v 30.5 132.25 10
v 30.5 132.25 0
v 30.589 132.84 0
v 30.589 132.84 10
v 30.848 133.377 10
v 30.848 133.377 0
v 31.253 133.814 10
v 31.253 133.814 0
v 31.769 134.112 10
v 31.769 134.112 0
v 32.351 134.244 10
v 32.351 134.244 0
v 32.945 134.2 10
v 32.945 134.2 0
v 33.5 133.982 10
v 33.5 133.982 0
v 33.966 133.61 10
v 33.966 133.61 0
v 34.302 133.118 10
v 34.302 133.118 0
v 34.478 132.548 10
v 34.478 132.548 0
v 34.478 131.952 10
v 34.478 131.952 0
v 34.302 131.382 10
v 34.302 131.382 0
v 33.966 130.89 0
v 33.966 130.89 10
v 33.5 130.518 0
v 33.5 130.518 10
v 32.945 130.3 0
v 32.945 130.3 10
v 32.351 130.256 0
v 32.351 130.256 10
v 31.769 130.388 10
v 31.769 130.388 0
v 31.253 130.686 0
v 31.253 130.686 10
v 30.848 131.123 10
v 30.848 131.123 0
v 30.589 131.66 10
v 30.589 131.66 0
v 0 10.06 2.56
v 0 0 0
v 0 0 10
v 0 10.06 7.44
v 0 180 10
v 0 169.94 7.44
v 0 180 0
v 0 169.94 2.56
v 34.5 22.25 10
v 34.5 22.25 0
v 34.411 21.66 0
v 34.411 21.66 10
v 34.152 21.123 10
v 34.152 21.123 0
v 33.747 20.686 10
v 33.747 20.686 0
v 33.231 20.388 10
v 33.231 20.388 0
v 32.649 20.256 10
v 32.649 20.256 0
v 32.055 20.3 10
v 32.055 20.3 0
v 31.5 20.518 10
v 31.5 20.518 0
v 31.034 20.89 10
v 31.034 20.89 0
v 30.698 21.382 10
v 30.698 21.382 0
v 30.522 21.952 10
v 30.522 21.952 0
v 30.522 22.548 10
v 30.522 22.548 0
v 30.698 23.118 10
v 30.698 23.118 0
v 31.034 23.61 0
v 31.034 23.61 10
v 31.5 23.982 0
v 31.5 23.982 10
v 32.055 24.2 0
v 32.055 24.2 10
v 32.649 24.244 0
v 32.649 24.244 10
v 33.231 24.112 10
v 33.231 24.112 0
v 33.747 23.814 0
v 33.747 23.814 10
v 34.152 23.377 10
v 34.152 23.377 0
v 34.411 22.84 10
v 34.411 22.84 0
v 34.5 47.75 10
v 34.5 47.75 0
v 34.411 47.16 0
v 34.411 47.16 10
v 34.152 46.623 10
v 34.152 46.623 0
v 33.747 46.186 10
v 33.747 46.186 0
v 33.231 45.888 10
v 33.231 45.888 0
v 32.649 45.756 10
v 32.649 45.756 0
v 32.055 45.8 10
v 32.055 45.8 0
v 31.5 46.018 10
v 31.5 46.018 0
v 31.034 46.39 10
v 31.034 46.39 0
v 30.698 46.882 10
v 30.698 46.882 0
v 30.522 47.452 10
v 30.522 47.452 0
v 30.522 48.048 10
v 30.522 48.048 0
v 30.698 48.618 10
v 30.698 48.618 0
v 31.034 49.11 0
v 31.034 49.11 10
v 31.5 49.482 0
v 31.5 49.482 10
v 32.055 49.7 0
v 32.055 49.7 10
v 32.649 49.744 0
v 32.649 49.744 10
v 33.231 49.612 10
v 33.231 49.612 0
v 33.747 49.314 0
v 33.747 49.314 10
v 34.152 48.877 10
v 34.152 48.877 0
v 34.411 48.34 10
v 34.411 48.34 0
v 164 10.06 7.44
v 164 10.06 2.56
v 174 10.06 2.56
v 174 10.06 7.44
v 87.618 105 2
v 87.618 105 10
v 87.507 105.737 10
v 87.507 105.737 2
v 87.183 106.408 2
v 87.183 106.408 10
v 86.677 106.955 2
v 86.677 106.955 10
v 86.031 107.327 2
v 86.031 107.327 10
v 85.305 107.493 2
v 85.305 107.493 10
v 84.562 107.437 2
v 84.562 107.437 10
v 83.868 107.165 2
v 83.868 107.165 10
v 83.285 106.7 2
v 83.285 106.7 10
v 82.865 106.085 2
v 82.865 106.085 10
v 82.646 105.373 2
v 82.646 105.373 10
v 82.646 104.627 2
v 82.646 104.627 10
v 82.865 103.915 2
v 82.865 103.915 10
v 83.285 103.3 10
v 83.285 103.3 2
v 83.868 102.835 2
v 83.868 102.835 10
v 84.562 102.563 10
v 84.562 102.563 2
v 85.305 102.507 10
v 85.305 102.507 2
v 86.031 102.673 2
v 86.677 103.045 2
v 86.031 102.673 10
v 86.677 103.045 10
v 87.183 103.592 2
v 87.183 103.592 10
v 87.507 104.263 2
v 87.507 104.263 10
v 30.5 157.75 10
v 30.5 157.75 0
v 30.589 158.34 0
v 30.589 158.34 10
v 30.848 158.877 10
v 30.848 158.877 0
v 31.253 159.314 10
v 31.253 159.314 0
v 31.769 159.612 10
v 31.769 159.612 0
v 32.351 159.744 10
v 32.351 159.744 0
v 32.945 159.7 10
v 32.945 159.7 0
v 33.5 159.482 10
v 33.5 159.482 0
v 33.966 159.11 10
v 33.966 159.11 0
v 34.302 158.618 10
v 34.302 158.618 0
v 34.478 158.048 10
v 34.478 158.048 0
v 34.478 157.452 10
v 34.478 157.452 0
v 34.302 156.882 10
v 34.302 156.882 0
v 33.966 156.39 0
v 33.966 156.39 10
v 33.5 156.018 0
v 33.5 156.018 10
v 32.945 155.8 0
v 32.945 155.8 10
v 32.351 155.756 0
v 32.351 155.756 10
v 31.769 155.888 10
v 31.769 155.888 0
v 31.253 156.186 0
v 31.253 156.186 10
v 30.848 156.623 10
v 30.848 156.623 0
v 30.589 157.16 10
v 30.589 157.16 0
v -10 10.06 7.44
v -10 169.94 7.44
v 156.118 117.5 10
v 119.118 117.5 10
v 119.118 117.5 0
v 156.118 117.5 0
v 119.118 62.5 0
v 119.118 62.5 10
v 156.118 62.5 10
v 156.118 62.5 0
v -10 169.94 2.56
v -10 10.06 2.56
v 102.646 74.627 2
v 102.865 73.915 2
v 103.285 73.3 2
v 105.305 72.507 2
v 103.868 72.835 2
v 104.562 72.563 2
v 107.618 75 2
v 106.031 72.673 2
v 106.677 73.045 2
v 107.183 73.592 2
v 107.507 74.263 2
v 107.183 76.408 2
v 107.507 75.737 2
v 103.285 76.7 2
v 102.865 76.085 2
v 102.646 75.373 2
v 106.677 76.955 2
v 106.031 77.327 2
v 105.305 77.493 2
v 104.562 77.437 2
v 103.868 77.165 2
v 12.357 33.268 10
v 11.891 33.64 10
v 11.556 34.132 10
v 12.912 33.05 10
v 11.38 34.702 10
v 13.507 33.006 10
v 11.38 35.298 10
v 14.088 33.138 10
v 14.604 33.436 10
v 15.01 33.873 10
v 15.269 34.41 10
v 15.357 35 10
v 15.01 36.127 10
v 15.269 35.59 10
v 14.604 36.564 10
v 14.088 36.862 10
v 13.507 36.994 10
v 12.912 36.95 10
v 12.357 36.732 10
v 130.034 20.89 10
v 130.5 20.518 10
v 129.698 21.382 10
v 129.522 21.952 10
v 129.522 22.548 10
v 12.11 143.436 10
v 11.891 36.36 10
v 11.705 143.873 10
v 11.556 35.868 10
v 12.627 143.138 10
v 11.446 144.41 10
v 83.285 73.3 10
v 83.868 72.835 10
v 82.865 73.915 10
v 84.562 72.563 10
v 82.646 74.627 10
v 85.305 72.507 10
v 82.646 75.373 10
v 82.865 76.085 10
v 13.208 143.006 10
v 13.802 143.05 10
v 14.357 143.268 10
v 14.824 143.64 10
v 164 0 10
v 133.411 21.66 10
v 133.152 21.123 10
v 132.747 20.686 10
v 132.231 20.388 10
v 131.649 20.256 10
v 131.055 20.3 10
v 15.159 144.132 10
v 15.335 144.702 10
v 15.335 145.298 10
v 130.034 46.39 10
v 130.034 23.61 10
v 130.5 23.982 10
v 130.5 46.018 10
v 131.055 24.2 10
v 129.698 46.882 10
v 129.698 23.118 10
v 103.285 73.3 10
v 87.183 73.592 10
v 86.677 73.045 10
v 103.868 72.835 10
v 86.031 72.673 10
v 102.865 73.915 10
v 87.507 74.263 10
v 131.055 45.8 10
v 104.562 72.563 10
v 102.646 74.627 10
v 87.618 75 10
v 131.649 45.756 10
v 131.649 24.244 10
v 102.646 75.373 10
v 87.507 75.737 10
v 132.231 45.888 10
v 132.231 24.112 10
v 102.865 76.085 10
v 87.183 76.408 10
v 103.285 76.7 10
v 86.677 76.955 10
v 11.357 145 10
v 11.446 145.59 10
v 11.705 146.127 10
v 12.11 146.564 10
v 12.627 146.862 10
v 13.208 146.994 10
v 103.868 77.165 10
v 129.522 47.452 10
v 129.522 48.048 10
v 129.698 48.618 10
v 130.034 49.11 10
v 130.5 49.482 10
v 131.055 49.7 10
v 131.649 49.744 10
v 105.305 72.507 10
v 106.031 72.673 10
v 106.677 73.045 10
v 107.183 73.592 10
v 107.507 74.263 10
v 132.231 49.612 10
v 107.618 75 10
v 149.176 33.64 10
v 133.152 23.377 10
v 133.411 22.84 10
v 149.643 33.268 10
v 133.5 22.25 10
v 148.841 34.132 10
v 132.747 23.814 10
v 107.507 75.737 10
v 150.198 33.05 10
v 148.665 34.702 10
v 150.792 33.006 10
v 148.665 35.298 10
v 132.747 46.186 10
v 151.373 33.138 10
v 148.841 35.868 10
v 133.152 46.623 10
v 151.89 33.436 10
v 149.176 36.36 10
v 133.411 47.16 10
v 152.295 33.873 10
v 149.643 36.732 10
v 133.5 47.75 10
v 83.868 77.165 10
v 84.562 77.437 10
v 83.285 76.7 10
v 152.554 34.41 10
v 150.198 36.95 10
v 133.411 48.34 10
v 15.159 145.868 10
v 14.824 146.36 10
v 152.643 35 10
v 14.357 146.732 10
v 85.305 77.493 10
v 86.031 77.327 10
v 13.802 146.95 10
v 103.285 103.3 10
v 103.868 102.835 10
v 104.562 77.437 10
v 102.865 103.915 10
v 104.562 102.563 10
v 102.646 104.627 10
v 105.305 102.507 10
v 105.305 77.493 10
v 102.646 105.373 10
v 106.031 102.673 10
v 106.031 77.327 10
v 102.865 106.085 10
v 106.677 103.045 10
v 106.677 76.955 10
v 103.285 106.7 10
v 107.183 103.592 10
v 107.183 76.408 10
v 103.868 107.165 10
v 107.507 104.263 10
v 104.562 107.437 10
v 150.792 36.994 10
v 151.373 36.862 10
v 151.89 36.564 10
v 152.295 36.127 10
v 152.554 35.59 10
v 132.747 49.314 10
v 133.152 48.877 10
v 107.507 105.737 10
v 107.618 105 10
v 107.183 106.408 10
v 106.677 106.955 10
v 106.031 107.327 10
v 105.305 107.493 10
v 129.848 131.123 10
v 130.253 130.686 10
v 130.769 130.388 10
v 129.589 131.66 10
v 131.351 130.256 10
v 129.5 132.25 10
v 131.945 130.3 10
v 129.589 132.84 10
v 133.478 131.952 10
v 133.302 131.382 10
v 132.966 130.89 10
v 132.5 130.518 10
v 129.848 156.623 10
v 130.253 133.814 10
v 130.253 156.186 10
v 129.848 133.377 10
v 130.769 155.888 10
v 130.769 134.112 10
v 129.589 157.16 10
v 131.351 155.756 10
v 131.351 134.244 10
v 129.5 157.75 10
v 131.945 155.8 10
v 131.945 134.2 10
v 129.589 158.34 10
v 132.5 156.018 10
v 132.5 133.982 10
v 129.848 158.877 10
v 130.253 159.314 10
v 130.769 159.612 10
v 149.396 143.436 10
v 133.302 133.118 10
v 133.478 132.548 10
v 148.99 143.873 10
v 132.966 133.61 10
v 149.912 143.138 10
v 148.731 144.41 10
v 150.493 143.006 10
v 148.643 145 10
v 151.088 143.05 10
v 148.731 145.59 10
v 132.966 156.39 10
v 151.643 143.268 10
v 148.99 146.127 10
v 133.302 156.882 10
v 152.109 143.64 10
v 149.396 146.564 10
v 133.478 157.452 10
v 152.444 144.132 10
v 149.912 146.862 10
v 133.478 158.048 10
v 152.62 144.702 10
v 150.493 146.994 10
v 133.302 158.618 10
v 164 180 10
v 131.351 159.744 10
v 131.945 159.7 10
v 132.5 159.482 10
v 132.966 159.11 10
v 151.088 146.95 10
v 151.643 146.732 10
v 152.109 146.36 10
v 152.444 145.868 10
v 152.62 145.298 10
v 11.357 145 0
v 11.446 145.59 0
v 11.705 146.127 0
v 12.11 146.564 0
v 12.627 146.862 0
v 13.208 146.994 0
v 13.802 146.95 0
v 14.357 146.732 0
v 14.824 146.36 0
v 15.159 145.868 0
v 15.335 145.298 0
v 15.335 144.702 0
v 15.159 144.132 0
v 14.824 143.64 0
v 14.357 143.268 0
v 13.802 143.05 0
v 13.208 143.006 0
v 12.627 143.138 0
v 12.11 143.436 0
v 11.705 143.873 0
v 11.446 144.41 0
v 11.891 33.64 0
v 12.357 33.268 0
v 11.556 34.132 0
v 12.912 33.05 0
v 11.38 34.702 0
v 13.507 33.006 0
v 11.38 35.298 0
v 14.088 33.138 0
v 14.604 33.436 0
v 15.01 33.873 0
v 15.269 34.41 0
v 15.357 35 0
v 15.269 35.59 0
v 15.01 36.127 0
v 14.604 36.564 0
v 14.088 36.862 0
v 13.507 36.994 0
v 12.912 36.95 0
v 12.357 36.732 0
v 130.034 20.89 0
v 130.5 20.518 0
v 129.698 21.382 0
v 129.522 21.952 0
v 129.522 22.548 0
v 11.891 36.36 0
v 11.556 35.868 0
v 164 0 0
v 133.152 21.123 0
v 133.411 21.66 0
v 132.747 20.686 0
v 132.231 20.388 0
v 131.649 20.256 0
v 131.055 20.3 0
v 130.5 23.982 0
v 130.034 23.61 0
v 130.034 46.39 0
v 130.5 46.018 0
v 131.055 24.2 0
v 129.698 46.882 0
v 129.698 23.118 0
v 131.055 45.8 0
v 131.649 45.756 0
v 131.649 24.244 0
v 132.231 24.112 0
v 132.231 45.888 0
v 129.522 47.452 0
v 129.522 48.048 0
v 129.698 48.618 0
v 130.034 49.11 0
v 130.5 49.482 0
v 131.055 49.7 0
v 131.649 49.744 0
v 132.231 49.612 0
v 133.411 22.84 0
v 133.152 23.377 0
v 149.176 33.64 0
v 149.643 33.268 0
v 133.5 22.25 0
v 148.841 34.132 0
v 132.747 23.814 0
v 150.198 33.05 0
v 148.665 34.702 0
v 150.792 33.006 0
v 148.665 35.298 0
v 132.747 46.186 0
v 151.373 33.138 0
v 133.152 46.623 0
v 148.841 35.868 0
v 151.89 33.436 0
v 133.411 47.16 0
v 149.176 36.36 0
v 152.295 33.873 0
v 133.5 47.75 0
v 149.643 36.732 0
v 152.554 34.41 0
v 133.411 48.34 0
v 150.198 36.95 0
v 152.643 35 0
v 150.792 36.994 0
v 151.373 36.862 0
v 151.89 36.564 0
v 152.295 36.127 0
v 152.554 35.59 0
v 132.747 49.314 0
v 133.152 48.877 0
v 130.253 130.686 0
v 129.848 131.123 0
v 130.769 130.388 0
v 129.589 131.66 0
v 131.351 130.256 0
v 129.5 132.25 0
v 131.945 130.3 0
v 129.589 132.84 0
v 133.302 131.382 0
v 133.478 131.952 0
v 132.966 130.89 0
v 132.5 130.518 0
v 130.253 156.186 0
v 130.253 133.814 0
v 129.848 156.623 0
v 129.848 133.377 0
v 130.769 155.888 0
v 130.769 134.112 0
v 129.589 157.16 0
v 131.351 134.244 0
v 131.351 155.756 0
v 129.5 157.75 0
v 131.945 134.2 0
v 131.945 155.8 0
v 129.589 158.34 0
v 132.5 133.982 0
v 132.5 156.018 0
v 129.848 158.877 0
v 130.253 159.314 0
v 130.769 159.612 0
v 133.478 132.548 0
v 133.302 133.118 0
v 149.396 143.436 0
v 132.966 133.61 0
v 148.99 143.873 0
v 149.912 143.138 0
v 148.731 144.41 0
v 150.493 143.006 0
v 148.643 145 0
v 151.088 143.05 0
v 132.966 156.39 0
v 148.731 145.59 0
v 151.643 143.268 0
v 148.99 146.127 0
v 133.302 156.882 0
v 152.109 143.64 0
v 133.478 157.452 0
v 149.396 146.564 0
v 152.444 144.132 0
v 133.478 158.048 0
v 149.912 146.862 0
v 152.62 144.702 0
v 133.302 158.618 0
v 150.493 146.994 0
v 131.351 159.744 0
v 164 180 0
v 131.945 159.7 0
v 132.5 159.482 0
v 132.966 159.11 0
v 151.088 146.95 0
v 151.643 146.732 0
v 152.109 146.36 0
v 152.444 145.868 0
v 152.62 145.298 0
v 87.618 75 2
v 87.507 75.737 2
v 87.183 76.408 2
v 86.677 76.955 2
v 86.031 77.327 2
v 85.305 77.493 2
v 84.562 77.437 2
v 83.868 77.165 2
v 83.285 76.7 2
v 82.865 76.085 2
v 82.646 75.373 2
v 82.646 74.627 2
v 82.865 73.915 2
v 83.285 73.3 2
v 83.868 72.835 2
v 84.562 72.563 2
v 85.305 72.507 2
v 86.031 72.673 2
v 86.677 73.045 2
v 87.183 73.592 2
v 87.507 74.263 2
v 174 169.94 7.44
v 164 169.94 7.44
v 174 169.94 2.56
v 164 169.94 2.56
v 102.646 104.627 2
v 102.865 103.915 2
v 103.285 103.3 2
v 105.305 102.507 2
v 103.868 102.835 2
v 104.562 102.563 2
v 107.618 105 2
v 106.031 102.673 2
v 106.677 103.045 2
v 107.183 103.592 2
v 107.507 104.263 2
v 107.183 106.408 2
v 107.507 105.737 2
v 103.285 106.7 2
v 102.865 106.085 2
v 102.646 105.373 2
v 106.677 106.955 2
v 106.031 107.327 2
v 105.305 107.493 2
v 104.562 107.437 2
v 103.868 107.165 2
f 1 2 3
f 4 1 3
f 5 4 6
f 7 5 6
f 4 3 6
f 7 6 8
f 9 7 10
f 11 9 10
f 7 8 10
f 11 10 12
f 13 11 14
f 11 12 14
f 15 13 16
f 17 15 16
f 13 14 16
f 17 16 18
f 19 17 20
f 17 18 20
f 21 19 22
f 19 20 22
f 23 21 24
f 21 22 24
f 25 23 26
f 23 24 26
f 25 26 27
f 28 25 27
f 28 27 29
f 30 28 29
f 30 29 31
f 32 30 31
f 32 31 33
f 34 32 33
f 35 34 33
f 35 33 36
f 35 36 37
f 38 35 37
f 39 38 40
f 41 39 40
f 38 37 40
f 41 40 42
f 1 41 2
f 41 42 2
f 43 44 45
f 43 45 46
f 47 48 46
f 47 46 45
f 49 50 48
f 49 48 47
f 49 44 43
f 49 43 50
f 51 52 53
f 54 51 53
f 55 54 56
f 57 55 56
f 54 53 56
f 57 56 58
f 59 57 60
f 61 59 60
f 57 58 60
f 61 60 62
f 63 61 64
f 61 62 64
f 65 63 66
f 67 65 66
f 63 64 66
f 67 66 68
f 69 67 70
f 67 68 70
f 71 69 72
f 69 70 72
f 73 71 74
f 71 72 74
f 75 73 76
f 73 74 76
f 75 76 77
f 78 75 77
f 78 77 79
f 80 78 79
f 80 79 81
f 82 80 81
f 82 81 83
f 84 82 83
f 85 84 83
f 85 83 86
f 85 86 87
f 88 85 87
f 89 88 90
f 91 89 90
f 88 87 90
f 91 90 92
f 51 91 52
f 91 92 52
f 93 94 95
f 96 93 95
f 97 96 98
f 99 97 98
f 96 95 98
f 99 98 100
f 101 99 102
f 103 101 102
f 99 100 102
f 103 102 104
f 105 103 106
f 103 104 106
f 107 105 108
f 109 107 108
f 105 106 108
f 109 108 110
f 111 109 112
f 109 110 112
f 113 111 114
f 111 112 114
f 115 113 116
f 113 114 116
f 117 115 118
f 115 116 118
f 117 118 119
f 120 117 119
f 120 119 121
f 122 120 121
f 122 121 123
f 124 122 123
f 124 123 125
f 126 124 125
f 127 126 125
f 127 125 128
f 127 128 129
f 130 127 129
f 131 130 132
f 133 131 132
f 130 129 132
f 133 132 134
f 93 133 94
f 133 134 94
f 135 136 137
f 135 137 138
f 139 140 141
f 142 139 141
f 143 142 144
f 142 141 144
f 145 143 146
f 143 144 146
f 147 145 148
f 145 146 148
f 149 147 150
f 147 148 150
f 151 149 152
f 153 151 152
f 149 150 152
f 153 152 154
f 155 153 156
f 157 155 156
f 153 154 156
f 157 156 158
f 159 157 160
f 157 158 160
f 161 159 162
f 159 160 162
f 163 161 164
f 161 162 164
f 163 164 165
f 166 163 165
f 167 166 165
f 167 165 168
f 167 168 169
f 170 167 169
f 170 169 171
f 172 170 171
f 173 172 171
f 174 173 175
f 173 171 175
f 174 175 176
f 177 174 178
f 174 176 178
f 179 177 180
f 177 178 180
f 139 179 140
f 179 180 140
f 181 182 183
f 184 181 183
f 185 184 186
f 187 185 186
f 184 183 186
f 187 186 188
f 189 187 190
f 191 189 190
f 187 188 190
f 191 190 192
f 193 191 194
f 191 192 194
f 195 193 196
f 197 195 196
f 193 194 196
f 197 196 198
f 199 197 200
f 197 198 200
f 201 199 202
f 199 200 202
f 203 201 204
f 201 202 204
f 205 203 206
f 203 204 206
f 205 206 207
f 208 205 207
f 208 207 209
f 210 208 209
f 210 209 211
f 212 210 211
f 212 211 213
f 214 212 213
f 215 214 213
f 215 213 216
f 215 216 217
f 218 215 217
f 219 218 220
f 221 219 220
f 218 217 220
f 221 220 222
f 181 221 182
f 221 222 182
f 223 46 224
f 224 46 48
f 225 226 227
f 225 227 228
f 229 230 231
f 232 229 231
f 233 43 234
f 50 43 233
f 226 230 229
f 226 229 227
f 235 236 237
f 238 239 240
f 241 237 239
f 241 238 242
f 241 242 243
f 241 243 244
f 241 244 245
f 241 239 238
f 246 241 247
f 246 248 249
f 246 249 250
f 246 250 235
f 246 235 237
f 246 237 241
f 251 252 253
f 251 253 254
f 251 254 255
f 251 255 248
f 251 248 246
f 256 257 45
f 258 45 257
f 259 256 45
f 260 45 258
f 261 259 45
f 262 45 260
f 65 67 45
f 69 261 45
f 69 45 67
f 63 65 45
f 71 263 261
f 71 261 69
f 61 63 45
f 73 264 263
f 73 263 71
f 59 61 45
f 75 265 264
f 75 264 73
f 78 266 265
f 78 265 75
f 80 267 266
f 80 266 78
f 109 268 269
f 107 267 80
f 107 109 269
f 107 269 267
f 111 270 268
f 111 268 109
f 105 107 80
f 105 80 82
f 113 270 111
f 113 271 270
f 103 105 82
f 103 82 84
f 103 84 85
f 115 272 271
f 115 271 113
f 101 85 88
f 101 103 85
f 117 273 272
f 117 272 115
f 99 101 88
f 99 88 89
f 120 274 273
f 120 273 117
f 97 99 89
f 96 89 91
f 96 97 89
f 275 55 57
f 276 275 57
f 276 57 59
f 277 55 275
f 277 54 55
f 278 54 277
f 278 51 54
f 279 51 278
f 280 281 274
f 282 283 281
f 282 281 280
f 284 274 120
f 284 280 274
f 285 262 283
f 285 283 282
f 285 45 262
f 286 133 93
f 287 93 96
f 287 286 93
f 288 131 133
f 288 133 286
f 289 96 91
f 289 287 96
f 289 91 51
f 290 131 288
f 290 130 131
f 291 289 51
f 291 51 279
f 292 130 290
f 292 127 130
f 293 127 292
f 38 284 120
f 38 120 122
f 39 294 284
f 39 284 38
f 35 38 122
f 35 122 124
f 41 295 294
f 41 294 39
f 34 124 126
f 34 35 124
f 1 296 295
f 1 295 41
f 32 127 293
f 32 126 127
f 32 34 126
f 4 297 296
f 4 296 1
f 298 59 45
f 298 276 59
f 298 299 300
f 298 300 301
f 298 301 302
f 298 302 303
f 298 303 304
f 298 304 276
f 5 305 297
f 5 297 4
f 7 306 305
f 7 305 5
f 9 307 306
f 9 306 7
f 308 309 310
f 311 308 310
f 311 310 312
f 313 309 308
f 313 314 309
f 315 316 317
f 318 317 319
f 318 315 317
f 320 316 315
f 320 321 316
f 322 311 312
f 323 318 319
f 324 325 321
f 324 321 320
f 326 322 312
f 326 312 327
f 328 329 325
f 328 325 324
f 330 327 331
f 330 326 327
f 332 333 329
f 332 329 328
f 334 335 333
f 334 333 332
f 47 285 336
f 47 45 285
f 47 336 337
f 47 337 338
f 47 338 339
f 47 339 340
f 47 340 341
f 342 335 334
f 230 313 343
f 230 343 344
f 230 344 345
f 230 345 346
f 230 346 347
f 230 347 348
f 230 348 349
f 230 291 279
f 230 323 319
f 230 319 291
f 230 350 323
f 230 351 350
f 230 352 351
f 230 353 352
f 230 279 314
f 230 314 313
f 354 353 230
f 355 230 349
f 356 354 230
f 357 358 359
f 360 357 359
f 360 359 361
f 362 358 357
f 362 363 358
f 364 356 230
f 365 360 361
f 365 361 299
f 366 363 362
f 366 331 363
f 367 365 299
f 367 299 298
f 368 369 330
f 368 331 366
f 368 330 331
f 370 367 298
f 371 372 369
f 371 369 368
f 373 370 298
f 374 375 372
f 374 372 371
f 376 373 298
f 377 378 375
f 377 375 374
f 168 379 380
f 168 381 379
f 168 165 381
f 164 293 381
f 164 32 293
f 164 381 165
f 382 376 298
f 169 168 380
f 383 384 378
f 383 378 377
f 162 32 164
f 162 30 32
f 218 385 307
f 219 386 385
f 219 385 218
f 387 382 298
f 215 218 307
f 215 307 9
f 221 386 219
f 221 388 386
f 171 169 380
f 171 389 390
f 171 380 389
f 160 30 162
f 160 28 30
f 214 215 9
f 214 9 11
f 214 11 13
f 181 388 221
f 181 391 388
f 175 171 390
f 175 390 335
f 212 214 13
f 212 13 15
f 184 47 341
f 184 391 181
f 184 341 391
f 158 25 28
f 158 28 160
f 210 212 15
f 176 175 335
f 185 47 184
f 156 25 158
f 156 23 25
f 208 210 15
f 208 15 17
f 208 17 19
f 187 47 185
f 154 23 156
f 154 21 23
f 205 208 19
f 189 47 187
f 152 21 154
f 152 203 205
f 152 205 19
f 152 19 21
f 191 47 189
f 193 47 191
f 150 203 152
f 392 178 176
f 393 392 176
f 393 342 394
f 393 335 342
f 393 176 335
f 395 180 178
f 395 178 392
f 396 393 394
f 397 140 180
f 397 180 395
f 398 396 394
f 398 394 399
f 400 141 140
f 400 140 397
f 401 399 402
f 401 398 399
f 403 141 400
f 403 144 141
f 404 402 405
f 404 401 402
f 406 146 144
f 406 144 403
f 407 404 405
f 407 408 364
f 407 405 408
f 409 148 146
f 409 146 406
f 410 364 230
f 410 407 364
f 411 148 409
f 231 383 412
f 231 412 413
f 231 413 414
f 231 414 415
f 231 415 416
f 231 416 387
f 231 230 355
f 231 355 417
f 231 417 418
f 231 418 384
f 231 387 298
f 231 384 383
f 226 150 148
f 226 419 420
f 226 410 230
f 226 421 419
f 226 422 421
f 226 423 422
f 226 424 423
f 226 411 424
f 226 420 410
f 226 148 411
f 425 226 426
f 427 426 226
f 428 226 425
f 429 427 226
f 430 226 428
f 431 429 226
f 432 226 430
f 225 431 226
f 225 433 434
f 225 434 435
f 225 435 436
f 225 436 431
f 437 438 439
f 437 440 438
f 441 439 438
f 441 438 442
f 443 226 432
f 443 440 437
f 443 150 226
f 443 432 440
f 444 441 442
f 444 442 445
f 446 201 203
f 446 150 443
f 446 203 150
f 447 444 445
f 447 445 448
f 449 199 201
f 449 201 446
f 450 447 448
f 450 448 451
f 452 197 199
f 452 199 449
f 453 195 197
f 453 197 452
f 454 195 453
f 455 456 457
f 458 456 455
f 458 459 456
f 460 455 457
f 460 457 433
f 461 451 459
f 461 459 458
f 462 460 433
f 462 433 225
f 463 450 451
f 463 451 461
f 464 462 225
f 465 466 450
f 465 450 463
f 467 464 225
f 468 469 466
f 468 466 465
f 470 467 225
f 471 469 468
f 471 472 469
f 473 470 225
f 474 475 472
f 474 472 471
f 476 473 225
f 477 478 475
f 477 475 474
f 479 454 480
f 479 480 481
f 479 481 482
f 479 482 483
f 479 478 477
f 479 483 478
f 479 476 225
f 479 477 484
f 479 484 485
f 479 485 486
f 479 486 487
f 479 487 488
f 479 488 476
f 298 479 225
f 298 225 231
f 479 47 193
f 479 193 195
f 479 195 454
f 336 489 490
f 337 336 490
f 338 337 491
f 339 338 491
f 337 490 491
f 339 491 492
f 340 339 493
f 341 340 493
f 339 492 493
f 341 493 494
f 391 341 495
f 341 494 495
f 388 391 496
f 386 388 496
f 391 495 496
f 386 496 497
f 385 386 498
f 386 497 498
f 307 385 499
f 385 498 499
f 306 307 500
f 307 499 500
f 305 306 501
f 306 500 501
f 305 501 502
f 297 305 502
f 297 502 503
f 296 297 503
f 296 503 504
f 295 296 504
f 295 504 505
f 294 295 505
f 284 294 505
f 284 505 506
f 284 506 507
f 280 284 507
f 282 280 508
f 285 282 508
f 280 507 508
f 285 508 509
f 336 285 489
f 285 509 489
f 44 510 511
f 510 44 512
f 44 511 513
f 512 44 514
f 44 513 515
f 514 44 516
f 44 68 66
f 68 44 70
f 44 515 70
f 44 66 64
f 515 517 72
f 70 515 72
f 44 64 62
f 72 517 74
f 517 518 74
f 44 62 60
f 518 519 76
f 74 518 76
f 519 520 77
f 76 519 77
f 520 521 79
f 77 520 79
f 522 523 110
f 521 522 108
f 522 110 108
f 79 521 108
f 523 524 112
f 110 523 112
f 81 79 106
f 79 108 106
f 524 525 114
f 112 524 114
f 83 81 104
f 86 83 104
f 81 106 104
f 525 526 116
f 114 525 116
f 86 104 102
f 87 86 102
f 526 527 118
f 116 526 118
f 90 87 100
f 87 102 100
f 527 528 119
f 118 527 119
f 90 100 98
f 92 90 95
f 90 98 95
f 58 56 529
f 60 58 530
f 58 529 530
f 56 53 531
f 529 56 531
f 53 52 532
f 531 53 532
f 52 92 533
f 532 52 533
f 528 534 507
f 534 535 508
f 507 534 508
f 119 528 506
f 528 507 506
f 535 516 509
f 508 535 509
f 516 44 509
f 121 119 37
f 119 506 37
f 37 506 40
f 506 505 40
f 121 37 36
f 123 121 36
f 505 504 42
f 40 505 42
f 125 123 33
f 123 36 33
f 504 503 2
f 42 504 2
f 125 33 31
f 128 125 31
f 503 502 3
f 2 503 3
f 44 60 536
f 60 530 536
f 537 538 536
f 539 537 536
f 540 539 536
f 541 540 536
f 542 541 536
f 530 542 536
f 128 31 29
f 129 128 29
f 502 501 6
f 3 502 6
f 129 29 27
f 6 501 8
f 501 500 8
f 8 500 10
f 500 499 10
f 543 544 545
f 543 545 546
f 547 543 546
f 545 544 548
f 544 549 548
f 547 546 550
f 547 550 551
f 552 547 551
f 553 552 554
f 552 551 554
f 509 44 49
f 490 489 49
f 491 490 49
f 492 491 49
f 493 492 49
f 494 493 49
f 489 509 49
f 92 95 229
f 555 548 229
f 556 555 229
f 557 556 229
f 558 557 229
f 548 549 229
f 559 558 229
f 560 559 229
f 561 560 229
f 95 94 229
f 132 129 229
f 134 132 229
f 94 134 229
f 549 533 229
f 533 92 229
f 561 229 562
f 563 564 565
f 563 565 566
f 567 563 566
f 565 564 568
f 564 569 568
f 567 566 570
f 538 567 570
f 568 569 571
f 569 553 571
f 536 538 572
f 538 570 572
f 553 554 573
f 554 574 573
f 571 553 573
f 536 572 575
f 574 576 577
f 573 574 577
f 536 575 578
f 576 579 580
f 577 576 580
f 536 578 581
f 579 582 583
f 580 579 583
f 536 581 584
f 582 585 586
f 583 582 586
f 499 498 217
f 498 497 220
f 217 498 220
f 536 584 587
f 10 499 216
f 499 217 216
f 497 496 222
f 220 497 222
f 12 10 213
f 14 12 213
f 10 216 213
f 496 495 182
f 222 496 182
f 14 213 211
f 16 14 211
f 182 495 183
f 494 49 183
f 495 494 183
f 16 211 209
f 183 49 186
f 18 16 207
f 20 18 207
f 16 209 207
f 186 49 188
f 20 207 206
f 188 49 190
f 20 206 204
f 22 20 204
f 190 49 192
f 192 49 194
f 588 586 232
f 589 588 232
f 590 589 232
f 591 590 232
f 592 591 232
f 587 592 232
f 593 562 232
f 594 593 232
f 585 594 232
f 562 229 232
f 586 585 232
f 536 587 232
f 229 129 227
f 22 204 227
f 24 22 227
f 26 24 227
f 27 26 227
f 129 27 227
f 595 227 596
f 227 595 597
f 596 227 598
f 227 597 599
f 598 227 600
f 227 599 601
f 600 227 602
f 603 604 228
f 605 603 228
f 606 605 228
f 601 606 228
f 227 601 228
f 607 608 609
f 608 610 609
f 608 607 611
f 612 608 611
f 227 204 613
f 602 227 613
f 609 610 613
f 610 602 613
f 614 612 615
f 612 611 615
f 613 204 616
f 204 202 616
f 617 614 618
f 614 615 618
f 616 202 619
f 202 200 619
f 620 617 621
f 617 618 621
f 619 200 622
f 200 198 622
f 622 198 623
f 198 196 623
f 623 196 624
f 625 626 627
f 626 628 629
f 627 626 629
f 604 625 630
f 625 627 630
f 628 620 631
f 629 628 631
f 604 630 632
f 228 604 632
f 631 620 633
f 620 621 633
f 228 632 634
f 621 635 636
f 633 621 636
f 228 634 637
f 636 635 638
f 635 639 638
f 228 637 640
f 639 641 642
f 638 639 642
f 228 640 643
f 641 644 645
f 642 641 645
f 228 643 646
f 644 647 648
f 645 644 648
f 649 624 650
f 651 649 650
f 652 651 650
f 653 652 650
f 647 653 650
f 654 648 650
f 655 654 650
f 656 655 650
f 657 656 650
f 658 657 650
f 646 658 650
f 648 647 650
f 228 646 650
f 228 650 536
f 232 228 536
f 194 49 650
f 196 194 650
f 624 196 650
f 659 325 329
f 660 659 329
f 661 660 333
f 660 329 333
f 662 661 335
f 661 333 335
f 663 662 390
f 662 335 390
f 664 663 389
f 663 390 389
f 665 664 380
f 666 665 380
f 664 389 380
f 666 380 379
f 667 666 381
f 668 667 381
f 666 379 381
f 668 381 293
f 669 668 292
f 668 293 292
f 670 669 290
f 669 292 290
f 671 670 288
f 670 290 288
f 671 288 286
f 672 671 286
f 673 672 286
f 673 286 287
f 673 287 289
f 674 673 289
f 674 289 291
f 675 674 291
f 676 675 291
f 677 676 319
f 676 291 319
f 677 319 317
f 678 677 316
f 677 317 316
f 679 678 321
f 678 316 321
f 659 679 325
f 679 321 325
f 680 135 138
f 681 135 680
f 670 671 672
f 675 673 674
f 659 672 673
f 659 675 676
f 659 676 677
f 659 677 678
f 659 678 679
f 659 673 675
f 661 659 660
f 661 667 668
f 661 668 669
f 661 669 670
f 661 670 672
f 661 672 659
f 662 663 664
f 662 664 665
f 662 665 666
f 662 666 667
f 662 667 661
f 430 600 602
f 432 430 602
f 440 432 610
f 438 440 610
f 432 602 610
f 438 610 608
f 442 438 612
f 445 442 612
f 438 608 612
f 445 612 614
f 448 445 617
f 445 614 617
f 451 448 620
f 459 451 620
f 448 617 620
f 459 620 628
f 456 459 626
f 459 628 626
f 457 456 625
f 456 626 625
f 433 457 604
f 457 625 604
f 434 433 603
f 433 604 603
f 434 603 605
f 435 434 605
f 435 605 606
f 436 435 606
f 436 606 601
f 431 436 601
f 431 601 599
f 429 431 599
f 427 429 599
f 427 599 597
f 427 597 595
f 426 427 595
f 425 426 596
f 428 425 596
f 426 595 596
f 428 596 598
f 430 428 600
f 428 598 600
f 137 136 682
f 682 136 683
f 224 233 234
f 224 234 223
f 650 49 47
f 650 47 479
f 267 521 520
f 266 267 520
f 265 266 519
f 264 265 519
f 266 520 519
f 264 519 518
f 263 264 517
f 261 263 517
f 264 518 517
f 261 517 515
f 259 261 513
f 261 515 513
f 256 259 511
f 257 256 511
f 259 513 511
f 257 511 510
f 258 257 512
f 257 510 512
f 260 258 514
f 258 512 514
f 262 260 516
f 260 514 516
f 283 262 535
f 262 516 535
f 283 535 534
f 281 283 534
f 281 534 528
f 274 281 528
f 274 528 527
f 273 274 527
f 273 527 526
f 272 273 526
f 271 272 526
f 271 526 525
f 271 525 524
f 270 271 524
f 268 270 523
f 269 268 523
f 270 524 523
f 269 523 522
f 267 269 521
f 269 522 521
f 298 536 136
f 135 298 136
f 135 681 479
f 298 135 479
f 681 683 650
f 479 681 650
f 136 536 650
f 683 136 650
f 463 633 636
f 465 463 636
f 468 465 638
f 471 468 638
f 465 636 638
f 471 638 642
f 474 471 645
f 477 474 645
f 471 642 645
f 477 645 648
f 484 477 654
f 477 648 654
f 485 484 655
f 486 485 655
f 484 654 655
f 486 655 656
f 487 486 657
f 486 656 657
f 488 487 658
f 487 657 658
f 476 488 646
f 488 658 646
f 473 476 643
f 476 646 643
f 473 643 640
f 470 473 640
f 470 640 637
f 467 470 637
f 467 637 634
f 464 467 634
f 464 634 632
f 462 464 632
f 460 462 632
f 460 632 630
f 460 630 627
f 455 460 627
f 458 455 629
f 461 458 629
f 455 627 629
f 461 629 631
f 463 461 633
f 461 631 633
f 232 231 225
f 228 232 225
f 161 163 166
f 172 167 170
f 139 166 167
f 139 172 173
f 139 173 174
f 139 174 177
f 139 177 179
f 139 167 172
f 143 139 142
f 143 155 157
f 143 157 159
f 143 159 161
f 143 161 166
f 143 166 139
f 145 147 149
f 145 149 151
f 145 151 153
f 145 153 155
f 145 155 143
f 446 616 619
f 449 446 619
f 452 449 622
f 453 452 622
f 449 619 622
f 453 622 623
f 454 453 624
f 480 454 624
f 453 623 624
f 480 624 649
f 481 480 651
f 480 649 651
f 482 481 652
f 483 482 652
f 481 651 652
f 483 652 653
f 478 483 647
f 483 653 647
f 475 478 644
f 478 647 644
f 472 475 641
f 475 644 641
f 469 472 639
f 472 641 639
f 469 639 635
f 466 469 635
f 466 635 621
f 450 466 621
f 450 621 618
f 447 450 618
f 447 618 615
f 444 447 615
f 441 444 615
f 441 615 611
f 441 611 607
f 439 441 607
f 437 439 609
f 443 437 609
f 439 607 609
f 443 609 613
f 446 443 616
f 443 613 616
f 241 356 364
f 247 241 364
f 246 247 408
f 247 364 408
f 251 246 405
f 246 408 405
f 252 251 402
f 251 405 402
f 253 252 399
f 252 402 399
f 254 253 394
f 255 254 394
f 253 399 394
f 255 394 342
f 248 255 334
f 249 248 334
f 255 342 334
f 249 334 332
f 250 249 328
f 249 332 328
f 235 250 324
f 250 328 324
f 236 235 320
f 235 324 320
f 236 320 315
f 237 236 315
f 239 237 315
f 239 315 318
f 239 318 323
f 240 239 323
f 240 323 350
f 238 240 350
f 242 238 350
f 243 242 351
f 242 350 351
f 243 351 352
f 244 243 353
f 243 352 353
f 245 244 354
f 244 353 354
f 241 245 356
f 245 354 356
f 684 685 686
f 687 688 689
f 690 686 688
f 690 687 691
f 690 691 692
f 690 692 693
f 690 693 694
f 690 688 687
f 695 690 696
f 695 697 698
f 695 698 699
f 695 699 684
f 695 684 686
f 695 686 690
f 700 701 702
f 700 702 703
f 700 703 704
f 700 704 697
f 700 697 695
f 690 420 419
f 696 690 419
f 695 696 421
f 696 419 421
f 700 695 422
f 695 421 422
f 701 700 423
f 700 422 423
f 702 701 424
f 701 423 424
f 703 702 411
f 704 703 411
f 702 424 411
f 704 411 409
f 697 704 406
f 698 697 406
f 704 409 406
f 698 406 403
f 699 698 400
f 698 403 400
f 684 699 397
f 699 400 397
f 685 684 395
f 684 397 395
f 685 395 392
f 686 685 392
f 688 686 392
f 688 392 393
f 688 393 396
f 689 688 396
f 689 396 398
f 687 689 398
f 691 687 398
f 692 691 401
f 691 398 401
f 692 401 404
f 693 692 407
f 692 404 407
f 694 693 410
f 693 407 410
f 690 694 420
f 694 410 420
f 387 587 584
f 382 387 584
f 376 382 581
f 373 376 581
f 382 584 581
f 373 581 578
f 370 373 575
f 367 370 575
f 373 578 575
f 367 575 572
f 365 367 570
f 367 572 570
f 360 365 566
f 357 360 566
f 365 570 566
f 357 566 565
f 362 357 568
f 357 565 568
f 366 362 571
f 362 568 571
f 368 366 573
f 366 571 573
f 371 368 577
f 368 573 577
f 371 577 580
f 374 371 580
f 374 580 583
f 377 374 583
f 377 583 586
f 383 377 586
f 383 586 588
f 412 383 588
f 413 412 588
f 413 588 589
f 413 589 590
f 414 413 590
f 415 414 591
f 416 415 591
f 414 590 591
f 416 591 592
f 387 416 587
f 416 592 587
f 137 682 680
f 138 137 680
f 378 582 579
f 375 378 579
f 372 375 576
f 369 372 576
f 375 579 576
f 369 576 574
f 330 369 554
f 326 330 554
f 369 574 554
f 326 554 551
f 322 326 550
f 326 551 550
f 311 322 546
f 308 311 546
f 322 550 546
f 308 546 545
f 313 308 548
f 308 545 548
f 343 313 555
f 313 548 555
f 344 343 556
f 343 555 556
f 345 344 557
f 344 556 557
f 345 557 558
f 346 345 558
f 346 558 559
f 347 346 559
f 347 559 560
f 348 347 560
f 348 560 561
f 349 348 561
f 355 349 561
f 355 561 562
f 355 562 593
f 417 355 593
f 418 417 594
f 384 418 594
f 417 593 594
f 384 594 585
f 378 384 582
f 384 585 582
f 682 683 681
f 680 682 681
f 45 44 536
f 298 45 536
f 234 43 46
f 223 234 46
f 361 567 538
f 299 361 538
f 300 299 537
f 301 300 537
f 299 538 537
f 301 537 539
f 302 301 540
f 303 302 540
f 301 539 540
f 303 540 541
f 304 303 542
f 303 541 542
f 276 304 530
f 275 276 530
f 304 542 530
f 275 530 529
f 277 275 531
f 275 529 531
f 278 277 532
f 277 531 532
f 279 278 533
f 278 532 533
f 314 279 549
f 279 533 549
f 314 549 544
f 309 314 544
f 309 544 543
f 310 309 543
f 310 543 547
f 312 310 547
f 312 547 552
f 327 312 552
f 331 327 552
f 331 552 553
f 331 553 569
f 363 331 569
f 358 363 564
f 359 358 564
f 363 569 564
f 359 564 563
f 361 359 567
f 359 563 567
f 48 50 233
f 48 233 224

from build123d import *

# Parameters (mm, degrees)
SKETCH_1_W          = 164
SKETCH_1_H          = 180
EXTRUDE_1_DEPTH     = 10
SKETCH_2_W          = 4.88
SKETCH_2_H          = 159.88
EXTRUDE_2_DEPTH     = 10
SKETCH_3_R          = 2
CUT_EXTRUDE_1_DEPTH = 10
SKETCH_5_R          = 2.5
SKETCH_5_W          = 37
SKETCH_5_H          = 55
CUT_EXTRUDE_3_DEPTH = 8
SKETCH_6_W          = 37
SKETCH_6_H          = 55
CUT_EXTRUDE_4_DEPTH = 8


with BuildPart() as part:
    # 草图1 → 凸台-拉伸1 (new body)
    with BuildSketch(Plane.XY):
        with Locations((82, 90)):
            Rectangle(SKETCH_1_W, SKETCH_1_H)
    extrude(amount=EXTRUDE_1_DEPTH)

    # 草图2 → 凸台-拉伸2 (add)
    with BuildSketch(Plane.ZY):
        with Locations((5, 90)):
            Rectangle(SKETCH_2_W, SKETCH_2_H)
    extrude_2 = extrude(amount=EXTRUDE_2_DEPTH)

    # 镜向1: 凸台-拉伸2 across plane
    add(extrude_2.mirror(Plane(origin=(82, 0, 0), x_dir=(0, 0, 1), z_dir=(1, 0, 0))))

    # 草图3 → 切除-拉伸1 (cut)
    with BuildSketch(Plane(origin=(0, 0, 0), x_dir=(-1, 0, 0), z_dir=(0, 0, -1))):
        with Locations((-150.6425573, 145)):
            Circle(SKETCH_3_R)
        with Locations((-131.5, 157.75)):
            Circle(SKETCH_3_R)
        with Locations((-131.5, 132.25)):
            Circle(SKETCH_3_R)
        with Locations((-13.3574427, 145)):
            Circle(SKETCH_3_R)
        with Locations((-32.5, 157.75)):
            Circle(SKETCH_3_R)
        with Locations((-32.5, 132.25)):
            Circle(SKETCH_3_R)
        with Locations(Location((-131.5, 47.75, 0), (0, 0, 180))):
            Circle(SKETCH_3_R)
        with Locations(Location((-131.5, 22.25, 0), (0, 0, 180))):
            Circle(SKETCH_3_R)
        with Locations(Location((-150.6425573, 35, 0), (0, 0, 180))):
            Circle(SKETCH_3_R)
        with Locations(Location((-32.5, 47.75, 0), (0, 0, 180))):
            Circle(SKETCH_3_R)
        with Locations(Location((-32.5, 22.25, 0), (0, 0, 180))):
            Circle(SKETCH_3_R)
        with Locations(Location((-13.3574427, 35, 0), (0, 0, 180))):
            Circle(SKETCH_3_R)
    extrude(amount=-CUT_EXTRUDE_1_DEPTH, mode=Mode.SUBTRACT)

    # 草图5 → 切除-拉伸3 (cut)
    with BuildSketch(Plane.XY.offset(10)):
        with Locations((85.117863175, 105)):
            Circle(SKETCH_5_R)
        with Locations((85.117863175, 75)):
            Circle(SKETCH_5_R)
        with Locations((105.117863175, 105)):
            Circle(SKETCH_5_R)
        with Locations((105.117863175, 75)):
            Circle(SKETCH_5_R)
        with Locations((137.617863175, 90)):
            Rectangle(SKETCH_5_W, SKETCH_5_H)
    extrude(amount=-CUT_EXTRUDE_3_DEPTH, mode=Mode.SUBTRACT)

    # 草图6 → 切除-拉伸4 (cut)
    with BuildSketch(Plane.XY.offset(2)):
        with Locations((137.617863175, 90)):
            Rectangle(SKETCH_6_W, SKETCH_6_H)
    extrude(amount=-CUT_EXTRUDE_4_DEPTH, mode=Mode.SUBTRACT)


solid = part.part
